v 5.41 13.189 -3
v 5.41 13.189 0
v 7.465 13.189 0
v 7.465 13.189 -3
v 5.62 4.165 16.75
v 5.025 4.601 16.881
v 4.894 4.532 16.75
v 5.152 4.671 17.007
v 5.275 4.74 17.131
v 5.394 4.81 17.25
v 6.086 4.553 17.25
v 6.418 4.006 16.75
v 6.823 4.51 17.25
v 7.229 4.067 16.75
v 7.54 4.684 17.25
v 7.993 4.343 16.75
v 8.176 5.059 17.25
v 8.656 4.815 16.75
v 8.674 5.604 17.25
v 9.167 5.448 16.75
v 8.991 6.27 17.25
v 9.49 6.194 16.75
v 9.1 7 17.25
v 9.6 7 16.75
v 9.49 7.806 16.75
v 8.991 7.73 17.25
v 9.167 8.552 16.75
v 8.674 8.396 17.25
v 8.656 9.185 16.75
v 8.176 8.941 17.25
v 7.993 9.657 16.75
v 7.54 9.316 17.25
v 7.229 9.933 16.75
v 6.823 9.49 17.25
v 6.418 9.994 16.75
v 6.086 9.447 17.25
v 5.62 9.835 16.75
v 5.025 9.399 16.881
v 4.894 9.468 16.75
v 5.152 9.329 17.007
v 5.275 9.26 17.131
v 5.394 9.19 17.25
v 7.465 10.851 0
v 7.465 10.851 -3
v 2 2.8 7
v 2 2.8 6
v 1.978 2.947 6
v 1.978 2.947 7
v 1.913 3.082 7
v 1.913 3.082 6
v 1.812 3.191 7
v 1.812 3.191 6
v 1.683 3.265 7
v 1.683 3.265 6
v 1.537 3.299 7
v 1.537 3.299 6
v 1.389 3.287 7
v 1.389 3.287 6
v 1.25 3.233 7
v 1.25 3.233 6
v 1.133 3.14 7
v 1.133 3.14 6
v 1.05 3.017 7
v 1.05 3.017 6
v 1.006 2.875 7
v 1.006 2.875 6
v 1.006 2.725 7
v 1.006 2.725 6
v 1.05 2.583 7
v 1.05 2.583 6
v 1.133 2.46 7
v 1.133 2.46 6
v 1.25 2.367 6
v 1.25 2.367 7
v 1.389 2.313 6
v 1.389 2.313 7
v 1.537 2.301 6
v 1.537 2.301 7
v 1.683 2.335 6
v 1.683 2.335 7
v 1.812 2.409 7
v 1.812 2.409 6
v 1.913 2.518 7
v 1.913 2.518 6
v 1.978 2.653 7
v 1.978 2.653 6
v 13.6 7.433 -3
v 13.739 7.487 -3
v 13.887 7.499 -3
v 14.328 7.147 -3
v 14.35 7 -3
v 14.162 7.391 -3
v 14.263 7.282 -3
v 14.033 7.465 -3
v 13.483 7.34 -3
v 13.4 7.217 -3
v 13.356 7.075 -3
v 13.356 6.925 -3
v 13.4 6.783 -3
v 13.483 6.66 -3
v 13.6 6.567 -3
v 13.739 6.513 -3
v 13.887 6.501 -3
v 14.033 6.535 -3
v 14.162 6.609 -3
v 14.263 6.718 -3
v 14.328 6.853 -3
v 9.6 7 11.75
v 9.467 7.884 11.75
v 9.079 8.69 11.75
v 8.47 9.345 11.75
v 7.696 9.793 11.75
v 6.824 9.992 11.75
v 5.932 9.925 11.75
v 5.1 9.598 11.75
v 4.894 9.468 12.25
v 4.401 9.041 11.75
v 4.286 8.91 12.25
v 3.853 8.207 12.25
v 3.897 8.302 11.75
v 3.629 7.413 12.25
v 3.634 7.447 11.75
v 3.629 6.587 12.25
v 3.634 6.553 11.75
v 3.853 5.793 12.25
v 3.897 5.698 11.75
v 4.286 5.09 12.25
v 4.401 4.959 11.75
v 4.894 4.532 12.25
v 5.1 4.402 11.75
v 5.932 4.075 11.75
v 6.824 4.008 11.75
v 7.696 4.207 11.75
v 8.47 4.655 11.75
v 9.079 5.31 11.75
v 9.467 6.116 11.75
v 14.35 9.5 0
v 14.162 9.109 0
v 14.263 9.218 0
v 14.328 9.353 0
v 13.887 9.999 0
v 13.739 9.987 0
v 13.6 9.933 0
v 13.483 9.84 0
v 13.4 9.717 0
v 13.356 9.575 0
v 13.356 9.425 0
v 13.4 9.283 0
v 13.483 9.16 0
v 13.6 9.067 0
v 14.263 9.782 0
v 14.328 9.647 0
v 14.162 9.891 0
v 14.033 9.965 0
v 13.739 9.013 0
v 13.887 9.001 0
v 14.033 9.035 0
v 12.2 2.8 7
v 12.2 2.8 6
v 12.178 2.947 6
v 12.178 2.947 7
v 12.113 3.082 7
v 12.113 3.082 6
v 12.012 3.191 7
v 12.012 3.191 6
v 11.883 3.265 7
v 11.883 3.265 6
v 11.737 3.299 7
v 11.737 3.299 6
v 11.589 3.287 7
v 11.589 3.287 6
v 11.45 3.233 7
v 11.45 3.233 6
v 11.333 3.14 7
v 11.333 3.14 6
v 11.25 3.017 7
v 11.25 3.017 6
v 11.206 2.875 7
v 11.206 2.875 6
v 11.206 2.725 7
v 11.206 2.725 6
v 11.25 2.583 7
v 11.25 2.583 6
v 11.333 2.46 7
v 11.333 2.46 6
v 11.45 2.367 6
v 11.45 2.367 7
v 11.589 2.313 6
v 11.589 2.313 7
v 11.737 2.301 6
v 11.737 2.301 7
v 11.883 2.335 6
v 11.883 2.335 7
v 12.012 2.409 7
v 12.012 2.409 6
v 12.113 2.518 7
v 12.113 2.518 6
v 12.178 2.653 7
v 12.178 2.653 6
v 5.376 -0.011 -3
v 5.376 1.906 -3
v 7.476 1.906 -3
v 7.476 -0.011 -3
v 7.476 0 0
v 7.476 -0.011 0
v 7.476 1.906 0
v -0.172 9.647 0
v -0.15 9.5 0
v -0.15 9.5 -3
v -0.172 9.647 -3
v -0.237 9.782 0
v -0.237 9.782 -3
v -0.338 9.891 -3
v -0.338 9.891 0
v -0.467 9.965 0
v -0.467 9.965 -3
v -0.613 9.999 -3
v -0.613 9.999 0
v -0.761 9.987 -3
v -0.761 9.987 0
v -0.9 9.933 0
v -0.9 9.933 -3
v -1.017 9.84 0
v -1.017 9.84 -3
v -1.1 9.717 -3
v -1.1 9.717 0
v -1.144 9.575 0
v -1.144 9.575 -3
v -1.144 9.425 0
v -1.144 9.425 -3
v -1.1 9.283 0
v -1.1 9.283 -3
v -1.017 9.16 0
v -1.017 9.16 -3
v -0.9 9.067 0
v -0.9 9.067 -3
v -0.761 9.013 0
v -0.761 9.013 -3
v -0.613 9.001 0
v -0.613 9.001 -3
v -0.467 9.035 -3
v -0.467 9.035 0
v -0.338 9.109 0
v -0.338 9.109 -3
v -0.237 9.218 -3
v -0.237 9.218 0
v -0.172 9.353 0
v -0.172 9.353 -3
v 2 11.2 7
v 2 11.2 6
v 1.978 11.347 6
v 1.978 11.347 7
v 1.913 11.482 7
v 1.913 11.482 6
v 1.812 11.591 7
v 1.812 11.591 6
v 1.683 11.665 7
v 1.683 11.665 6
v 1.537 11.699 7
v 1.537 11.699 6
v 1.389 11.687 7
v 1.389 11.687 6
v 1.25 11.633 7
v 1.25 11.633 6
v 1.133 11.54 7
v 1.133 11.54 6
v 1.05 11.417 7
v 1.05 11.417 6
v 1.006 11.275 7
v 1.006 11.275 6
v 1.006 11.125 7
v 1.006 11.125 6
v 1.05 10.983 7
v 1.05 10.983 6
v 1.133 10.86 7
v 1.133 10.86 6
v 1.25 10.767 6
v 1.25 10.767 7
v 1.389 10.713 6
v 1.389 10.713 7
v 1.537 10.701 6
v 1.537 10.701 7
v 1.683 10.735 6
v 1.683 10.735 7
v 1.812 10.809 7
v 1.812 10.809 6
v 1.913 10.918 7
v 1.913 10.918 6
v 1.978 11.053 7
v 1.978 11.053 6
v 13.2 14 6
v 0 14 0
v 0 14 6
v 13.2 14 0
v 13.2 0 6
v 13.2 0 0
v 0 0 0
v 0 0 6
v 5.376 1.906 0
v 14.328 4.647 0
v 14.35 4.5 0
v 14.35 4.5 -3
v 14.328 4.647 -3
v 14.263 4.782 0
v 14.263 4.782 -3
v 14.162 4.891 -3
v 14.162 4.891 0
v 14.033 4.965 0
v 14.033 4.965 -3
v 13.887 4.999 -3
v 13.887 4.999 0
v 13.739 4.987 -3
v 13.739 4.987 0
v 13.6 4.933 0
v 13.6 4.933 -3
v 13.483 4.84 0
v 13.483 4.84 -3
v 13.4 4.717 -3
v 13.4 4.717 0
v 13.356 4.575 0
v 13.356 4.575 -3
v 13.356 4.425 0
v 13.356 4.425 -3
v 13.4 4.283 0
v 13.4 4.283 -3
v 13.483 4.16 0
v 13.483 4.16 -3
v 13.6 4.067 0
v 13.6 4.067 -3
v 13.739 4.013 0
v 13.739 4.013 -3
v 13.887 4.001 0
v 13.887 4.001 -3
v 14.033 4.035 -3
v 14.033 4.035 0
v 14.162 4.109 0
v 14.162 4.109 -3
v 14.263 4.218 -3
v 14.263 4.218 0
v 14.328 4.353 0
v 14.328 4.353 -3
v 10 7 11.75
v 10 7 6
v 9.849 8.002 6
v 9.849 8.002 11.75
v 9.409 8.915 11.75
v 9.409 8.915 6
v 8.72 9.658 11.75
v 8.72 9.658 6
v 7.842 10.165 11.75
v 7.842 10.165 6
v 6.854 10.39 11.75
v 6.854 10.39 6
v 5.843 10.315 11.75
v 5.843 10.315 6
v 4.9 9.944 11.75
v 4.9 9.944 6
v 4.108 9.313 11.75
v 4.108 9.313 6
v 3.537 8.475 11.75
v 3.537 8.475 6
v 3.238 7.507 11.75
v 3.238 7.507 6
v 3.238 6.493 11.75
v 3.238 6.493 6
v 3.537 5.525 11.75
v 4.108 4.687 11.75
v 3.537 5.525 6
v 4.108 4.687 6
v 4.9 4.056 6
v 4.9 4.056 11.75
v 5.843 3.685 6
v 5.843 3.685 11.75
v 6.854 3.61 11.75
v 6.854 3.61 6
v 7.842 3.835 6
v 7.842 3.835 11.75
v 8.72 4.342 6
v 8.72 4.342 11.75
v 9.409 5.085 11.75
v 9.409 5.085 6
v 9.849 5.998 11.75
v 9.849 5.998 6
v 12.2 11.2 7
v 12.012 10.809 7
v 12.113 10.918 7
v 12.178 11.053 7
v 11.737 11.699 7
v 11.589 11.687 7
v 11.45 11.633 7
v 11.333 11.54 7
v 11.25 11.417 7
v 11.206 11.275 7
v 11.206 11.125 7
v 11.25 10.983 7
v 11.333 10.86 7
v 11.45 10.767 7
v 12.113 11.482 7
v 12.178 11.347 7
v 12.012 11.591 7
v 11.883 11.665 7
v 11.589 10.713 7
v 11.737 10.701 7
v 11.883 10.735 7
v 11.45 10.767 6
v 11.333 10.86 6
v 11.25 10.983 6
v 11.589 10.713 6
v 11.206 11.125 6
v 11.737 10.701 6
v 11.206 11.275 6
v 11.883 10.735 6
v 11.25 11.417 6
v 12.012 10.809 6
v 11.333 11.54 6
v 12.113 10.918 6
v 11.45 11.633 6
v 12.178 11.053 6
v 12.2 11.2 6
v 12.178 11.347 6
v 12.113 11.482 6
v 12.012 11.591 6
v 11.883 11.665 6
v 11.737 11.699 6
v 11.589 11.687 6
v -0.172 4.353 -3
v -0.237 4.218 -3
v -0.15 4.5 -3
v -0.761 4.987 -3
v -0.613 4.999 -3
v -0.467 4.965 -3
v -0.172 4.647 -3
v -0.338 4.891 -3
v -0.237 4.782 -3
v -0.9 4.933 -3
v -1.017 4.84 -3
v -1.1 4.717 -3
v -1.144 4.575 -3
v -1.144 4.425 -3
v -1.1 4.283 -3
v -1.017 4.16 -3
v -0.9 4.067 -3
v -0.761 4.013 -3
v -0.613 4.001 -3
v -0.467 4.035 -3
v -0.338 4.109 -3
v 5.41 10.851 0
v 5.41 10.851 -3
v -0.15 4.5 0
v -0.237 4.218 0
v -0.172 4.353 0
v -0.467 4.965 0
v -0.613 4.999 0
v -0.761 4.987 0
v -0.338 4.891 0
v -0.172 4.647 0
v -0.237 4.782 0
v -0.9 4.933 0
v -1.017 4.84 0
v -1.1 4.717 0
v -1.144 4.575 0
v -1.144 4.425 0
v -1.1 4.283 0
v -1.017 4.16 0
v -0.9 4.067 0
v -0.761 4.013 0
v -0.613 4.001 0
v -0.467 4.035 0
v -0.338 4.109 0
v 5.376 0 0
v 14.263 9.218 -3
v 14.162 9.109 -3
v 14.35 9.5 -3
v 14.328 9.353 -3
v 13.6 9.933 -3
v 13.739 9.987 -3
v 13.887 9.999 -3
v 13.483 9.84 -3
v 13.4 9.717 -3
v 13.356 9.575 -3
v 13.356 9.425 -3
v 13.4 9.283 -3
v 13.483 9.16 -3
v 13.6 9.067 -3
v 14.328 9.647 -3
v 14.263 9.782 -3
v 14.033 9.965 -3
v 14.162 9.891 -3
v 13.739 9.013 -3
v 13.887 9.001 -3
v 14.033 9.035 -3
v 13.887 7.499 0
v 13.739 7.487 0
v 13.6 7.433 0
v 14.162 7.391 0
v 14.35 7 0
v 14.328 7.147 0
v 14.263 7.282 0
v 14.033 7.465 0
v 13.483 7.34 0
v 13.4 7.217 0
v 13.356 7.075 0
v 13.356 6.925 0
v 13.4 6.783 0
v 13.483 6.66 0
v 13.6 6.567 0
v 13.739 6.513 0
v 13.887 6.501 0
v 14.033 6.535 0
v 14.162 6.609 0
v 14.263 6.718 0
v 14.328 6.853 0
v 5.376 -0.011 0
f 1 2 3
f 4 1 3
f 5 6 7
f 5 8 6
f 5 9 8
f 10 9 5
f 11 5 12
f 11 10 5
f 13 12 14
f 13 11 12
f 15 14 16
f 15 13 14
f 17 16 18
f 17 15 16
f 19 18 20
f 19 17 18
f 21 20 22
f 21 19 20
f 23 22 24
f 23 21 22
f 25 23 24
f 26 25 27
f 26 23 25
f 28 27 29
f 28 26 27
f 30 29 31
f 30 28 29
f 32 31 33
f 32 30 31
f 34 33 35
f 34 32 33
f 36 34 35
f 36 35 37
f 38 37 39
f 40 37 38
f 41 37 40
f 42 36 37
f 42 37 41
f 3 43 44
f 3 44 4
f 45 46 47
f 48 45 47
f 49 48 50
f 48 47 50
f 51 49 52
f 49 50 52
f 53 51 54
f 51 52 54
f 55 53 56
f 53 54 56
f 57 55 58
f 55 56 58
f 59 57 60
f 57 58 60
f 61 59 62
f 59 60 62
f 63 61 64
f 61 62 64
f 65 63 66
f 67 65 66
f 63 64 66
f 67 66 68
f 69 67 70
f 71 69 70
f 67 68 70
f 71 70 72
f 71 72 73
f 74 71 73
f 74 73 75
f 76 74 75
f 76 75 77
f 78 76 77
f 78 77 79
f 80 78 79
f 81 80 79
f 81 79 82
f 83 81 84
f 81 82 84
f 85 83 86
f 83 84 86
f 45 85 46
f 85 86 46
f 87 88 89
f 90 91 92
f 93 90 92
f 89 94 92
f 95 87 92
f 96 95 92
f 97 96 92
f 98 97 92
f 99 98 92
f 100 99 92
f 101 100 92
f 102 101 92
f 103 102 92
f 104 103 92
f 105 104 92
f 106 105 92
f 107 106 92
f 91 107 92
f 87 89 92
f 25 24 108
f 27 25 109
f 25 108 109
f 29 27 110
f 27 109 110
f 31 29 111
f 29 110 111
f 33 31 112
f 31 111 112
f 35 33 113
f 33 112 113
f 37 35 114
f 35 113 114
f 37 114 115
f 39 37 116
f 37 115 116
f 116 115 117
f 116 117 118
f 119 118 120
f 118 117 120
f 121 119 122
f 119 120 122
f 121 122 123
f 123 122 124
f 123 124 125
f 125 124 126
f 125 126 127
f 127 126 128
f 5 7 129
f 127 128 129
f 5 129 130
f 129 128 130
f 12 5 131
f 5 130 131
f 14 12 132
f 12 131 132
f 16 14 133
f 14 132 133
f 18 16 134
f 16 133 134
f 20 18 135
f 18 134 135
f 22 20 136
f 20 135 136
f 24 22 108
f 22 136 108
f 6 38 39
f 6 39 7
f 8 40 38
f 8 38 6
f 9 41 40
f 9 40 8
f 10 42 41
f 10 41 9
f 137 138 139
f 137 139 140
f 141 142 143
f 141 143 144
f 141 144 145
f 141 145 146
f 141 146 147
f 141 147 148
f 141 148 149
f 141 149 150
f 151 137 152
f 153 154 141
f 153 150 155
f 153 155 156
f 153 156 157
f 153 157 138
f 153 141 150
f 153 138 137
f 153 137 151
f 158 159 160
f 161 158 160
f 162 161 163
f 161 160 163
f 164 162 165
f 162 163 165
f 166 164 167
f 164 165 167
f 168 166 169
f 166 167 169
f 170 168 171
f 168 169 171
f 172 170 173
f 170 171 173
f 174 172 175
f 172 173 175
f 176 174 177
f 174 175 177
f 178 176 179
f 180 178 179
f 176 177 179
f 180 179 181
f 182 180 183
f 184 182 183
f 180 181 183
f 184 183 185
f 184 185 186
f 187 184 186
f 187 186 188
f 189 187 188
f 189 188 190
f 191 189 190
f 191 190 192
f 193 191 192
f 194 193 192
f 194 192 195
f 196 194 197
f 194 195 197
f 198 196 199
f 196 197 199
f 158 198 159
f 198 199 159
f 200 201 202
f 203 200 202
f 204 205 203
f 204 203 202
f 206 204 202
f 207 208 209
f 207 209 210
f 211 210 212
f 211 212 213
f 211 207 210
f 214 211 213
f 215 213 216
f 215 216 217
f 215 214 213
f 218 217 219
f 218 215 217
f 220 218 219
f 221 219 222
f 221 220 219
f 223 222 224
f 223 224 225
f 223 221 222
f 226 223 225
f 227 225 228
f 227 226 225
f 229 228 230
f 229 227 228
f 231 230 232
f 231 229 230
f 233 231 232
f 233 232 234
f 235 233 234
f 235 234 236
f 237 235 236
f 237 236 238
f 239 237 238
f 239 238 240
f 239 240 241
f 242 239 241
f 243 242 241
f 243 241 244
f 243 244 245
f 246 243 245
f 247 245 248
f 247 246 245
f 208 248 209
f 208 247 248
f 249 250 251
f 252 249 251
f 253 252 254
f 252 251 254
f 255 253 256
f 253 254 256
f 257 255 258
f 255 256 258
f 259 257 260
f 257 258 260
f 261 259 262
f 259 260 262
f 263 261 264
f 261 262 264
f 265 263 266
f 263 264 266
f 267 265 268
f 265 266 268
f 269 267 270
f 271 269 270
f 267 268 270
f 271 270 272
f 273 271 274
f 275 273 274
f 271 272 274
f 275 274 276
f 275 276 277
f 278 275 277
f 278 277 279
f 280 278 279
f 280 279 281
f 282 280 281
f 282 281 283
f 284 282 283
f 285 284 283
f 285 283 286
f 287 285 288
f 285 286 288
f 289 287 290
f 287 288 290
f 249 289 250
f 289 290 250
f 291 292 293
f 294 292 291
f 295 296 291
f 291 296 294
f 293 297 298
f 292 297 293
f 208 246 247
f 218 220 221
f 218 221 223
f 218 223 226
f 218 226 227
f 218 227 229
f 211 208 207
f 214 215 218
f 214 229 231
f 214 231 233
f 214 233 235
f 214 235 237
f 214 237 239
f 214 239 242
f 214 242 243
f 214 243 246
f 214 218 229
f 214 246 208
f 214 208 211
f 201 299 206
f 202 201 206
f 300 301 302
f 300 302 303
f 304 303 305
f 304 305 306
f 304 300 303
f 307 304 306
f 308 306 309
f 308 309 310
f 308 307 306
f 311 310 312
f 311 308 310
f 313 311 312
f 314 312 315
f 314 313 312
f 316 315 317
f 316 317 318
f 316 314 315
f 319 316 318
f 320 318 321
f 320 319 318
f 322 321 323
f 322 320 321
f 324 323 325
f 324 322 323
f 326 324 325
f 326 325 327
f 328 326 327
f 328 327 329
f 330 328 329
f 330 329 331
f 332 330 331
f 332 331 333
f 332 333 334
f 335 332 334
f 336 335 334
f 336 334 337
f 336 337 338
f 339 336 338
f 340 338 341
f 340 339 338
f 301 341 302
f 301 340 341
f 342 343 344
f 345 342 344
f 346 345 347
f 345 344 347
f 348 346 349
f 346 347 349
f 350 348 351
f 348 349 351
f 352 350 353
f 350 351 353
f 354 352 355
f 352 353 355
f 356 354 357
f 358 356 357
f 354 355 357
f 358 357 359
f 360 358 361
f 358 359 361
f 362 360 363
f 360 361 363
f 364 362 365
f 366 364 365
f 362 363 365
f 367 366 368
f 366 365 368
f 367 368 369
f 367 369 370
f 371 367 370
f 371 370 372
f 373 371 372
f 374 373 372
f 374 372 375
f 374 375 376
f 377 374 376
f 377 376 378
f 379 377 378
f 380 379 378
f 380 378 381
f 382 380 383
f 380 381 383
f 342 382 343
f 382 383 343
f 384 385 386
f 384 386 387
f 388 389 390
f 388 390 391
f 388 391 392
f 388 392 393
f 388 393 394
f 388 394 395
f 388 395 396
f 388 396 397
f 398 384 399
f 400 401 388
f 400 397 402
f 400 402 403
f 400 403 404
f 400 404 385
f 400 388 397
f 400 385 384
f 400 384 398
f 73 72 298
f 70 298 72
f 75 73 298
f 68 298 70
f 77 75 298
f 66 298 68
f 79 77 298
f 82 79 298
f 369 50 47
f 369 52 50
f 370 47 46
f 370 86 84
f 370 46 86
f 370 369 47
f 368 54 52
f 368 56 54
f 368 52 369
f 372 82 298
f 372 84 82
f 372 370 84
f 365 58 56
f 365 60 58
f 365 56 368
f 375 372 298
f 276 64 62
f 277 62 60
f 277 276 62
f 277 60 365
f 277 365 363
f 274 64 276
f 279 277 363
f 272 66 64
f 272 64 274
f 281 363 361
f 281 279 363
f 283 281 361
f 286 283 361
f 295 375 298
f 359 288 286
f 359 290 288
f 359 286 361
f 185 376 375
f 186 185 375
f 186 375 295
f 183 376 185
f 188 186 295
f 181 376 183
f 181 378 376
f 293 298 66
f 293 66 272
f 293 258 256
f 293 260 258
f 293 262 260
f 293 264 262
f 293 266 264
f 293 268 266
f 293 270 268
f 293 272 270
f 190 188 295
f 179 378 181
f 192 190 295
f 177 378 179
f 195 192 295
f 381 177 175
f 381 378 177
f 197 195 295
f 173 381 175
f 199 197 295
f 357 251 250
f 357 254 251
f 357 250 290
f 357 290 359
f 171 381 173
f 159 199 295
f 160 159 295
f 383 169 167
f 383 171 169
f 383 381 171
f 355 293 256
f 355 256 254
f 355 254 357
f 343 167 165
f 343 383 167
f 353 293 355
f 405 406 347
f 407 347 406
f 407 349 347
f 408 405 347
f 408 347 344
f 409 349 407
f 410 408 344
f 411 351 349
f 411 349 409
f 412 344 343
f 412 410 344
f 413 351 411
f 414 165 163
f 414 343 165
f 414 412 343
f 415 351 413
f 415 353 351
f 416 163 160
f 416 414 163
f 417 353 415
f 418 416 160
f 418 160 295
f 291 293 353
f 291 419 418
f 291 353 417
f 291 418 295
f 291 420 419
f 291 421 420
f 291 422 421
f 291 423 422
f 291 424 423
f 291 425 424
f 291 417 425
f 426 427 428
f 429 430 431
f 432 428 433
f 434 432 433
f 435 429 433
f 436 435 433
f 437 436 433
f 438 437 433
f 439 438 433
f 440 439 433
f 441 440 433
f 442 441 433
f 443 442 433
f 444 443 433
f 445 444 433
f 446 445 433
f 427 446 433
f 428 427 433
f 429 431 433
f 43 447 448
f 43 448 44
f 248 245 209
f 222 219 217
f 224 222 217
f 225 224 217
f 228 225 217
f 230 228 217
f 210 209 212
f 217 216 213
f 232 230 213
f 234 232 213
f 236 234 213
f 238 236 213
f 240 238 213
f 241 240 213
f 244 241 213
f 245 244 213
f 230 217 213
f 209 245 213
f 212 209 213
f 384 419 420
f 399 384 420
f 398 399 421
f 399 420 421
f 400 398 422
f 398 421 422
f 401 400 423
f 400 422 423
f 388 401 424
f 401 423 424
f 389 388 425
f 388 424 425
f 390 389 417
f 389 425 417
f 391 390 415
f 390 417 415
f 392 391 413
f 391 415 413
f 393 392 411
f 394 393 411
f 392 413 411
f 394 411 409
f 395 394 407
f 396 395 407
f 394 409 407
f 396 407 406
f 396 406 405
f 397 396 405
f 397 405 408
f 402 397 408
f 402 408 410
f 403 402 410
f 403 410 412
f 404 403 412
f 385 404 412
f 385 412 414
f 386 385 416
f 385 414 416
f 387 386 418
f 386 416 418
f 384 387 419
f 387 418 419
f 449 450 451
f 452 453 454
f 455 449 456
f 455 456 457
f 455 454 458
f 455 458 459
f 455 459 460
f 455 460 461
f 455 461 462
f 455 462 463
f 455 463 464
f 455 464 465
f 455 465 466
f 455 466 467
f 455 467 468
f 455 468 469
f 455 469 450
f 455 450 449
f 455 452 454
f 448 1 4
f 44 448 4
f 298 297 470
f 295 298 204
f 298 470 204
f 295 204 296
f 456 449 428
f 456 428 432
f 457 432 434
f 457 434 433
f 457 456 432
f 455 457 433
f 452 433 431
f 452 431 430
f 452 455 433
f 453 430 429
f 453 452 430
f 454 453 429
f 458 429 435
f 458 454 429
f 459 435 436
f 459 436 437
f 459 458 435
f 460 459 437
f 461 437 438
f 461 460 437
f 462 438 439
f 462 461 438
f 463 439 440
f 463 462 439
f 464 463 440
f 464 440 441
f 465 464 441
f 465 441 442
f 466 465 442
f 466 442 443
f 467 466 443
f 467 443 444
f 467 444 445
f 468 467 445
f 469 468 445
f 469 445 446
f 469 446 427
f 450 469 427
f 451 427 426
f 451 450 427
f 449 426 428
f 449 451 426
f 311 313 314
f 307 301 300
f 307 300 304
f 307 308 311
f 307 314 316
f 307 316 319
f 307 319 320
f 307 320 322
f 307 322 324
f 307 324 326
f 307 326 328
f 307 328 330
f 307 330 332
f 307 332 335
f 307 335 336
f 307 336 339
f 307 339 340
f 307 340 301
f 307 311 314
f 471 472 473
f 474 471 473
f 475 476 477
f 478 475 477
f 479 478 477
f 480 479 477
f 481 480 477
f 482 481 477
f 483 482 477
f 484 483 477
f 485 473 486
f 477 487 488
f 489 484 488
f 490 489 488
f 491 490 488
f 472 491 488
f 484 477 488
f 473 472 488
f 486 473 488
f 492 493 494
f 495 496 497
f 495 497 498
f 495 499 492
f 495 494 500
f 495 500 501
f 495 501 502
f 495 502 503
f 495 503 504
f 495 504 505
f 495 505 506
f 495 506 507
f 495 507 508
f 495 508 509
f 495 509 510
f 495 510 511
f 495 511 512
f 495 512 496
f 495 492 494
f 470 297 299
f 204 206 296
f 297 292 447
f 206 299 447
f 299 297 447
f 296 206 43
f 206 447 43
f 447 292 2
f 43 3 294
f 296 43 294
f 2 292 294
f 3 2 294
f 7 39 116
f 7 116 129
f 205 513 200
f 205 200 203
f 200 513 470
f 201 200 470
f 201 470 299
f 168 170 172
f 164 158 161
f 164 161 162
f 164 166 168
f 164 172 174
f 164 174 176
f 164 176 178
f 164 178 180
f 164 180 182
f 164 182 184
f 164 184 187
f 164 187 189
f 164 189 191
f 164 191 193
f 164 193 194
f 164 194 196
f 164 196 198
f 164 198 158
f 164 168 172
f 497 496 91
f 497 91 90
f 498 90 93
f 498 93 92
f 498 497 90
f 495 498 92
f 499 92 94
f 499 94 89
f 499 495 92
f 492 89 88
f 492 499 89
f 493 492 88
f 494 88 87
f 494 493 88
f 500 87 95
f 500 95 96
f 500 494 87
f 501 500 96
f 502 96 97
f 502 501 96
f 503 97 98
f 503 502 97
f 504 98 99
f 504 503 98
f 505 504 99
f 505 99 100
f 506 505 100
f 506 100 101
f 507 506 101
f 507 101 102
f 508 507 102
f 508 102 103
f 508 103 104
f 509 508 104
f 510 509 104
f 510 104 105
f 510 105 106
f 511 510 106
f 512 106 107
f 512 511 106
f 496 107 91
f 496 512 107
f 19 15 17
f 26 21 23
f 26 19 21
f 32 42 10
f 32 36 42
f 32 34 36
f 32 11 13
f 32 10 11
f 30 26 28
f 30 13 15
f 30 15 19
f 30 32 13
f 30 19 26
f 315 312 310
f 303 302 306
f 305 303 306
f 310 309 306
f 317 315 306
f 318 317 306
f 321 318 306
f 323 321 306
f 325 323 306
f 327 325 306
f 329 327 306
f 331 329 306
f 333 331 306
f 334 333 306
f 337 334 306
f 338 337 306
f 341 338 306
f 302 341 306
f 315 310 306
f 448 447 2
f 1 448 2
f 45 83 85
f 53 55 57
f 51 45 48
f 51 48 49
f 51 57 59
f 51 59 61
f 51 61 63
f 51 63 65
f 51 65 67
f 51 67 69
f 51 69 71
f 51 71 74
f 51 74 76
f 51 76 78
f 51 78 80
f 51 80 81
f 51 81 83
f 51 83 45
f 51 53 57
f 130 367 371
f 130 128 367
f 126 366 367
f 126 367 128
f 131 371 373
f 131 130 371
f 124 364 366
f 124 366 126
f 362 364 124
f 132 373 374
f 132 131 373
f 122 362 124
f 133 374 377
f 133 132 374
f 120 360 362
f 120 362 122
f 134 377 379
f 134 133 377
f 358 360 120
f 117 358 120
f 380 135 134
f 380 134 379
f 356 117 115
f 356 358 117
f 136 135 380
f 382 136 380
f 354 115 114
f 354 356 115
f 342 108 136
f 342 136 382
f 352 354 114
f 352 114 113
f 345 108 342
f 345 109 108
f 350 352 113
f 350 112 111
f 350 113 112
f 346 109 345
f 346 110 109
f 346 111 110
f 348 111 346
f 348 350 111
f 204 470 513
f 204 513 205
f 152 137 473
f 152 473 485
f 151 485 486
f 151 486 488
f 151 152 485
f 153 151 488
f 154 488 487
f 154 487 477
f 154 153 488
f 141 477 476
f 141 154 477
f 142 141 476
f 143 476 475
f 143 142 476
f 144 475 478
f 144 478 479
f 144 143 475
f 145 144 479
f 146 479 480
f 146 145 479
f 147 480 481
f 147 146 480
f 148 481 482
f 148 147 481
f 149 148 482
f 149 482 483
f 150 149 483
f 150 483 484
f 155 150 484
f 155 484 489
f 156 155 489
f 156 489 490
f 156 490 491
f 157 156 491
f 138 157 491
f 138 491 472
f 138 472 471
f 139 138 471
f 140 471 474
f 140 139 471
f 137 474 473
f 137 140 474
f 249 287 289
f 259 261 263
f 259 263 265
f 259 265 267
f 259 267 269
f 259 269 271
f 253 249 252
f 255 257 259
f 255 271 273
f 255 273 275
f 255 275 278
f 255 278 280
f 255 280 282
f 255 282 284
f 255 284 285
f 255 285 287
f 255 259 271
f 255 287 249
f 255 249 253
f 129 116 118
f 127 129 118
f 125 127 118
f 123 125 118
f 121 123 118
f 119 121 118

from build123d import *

# Parameters (mm, degrees)
SKETCH005_R   = 0.5
SKETCH005_W   = 2.1
SKETCH005_H   = 1.916411
SKETCH005_W_2 = 2.05481
SKETCH005_H_2 = 2.338926
PAD004_DEPTH  = 3
SKETCH_W      = 13.2
SKETCH_H      = 14
PAD_DEPTH     = 6
SKETCH001_R   = 3.4
PAD001_DEPTH  = 5.75
SKETCH002_R   = 3
PAD002_DEPTH  = 5.5
POCKET_DEPTH  = 5
CHAMFER_SIZE  = 0.5
SKETCH004_R   = 0.5
PAD003_DEPTH  = 1


with BuildPart() as pad004:
    # Sketch005 → Pad004 (new body)
    with BuildSketch(Plane(origin=(-0.65, 4.5, 0), x_dir=(1, 0, 0), z_dir=(0, 0, 1))):
        Circle(SKETCH005_R)
        with Locations((14.5, 0)):
            Circle(SKETCH005_R)
        with Locations((14.5, 5)):
            Circle(SKETCH005_R)
        with Locations((0, 5)):
            Circle(SKETCH005_R)
        with Locations((14.5, 2.5)):
            Circle(SKETCH005_R)
        with Locations((7.07597, -3.552366)):
            Rectangle(SKETCH005_W, SKETCH005_H)
        with Locations((7.087742, 7.519965)):
            Rectangle(SKETCH005_W_2, SKETCH005_H_2)
    extrude(amount=-PAD004_DEPTH)


with BuildPart() as fusion:
    # Sketch → Pad (new body)
    with BuildSketch(Plane.XY):
        with Locations((6.6, 7)):
            Rectangle(SKETCH_W, SKETCH_H)
    extrude(amount=PAD_DEPTH)

    # Sketch001 → Pad001 (new body)
    with BuildSketch(Plane.XY.offset(6)):
        with Locations((6.6, 7)):
            Circle(SKETCH001_R)
    extrude(amount=PAD001_DEPTH)

    # Sketch002 → Pad002 (new body)
    with BuildSketch(Plane.XY.offset(11.75)):
        with Locations((6.6, 7)):
            Circle(SKETCH002_R)
    extrude(amount=PAD002_DEPTH)

    # Sketch003 → Pocket (cut)
    with BuildSketch(Plane.XY.offset(17.25)):
        with BuildLine():
            Line((4.894401, 9.467982), (4.894401, 4.532018))
            ThreePointArc((4.894401, 9.467982), (3.6, 7), (4.894401, 4.532018))
        make_face()
    extrude(amount=-POCKET_DEPTH, mode=Mode.SUBTRACT)

    # Chamfer
    chamfer_edges = [fusion.edges().sort_by_distance(p)[0] for p in [
        (7.993414, 9.656765, 17.25),
        (7.993414, 4.343235, 17.25),
        (4.894401, 7, 17.25),
    ]]
    chamfer(chamfer_edges, length=CHAMFER_SIZE)

    # Sketch004 → Pad003 (new body)
    with BuildSketch(Plane.XY.offset(6)):
        with Locations((1.5, 11.2)):
            Circle(SKETCH004_R)
        with Locations((1.5, 2.8)):
            Circle(SKETCH004_R)
        with Locations((11.7, 11.2)):
            Circle(SKETCH004_R)
        with Locations((11.7, 2.8)):
            Circle(SKETCH004_R)
    extrude(amount=PAD003_DEPTH)

    # Fusion: union Pad004
    add(pad004.part)


solid = fusion.part
